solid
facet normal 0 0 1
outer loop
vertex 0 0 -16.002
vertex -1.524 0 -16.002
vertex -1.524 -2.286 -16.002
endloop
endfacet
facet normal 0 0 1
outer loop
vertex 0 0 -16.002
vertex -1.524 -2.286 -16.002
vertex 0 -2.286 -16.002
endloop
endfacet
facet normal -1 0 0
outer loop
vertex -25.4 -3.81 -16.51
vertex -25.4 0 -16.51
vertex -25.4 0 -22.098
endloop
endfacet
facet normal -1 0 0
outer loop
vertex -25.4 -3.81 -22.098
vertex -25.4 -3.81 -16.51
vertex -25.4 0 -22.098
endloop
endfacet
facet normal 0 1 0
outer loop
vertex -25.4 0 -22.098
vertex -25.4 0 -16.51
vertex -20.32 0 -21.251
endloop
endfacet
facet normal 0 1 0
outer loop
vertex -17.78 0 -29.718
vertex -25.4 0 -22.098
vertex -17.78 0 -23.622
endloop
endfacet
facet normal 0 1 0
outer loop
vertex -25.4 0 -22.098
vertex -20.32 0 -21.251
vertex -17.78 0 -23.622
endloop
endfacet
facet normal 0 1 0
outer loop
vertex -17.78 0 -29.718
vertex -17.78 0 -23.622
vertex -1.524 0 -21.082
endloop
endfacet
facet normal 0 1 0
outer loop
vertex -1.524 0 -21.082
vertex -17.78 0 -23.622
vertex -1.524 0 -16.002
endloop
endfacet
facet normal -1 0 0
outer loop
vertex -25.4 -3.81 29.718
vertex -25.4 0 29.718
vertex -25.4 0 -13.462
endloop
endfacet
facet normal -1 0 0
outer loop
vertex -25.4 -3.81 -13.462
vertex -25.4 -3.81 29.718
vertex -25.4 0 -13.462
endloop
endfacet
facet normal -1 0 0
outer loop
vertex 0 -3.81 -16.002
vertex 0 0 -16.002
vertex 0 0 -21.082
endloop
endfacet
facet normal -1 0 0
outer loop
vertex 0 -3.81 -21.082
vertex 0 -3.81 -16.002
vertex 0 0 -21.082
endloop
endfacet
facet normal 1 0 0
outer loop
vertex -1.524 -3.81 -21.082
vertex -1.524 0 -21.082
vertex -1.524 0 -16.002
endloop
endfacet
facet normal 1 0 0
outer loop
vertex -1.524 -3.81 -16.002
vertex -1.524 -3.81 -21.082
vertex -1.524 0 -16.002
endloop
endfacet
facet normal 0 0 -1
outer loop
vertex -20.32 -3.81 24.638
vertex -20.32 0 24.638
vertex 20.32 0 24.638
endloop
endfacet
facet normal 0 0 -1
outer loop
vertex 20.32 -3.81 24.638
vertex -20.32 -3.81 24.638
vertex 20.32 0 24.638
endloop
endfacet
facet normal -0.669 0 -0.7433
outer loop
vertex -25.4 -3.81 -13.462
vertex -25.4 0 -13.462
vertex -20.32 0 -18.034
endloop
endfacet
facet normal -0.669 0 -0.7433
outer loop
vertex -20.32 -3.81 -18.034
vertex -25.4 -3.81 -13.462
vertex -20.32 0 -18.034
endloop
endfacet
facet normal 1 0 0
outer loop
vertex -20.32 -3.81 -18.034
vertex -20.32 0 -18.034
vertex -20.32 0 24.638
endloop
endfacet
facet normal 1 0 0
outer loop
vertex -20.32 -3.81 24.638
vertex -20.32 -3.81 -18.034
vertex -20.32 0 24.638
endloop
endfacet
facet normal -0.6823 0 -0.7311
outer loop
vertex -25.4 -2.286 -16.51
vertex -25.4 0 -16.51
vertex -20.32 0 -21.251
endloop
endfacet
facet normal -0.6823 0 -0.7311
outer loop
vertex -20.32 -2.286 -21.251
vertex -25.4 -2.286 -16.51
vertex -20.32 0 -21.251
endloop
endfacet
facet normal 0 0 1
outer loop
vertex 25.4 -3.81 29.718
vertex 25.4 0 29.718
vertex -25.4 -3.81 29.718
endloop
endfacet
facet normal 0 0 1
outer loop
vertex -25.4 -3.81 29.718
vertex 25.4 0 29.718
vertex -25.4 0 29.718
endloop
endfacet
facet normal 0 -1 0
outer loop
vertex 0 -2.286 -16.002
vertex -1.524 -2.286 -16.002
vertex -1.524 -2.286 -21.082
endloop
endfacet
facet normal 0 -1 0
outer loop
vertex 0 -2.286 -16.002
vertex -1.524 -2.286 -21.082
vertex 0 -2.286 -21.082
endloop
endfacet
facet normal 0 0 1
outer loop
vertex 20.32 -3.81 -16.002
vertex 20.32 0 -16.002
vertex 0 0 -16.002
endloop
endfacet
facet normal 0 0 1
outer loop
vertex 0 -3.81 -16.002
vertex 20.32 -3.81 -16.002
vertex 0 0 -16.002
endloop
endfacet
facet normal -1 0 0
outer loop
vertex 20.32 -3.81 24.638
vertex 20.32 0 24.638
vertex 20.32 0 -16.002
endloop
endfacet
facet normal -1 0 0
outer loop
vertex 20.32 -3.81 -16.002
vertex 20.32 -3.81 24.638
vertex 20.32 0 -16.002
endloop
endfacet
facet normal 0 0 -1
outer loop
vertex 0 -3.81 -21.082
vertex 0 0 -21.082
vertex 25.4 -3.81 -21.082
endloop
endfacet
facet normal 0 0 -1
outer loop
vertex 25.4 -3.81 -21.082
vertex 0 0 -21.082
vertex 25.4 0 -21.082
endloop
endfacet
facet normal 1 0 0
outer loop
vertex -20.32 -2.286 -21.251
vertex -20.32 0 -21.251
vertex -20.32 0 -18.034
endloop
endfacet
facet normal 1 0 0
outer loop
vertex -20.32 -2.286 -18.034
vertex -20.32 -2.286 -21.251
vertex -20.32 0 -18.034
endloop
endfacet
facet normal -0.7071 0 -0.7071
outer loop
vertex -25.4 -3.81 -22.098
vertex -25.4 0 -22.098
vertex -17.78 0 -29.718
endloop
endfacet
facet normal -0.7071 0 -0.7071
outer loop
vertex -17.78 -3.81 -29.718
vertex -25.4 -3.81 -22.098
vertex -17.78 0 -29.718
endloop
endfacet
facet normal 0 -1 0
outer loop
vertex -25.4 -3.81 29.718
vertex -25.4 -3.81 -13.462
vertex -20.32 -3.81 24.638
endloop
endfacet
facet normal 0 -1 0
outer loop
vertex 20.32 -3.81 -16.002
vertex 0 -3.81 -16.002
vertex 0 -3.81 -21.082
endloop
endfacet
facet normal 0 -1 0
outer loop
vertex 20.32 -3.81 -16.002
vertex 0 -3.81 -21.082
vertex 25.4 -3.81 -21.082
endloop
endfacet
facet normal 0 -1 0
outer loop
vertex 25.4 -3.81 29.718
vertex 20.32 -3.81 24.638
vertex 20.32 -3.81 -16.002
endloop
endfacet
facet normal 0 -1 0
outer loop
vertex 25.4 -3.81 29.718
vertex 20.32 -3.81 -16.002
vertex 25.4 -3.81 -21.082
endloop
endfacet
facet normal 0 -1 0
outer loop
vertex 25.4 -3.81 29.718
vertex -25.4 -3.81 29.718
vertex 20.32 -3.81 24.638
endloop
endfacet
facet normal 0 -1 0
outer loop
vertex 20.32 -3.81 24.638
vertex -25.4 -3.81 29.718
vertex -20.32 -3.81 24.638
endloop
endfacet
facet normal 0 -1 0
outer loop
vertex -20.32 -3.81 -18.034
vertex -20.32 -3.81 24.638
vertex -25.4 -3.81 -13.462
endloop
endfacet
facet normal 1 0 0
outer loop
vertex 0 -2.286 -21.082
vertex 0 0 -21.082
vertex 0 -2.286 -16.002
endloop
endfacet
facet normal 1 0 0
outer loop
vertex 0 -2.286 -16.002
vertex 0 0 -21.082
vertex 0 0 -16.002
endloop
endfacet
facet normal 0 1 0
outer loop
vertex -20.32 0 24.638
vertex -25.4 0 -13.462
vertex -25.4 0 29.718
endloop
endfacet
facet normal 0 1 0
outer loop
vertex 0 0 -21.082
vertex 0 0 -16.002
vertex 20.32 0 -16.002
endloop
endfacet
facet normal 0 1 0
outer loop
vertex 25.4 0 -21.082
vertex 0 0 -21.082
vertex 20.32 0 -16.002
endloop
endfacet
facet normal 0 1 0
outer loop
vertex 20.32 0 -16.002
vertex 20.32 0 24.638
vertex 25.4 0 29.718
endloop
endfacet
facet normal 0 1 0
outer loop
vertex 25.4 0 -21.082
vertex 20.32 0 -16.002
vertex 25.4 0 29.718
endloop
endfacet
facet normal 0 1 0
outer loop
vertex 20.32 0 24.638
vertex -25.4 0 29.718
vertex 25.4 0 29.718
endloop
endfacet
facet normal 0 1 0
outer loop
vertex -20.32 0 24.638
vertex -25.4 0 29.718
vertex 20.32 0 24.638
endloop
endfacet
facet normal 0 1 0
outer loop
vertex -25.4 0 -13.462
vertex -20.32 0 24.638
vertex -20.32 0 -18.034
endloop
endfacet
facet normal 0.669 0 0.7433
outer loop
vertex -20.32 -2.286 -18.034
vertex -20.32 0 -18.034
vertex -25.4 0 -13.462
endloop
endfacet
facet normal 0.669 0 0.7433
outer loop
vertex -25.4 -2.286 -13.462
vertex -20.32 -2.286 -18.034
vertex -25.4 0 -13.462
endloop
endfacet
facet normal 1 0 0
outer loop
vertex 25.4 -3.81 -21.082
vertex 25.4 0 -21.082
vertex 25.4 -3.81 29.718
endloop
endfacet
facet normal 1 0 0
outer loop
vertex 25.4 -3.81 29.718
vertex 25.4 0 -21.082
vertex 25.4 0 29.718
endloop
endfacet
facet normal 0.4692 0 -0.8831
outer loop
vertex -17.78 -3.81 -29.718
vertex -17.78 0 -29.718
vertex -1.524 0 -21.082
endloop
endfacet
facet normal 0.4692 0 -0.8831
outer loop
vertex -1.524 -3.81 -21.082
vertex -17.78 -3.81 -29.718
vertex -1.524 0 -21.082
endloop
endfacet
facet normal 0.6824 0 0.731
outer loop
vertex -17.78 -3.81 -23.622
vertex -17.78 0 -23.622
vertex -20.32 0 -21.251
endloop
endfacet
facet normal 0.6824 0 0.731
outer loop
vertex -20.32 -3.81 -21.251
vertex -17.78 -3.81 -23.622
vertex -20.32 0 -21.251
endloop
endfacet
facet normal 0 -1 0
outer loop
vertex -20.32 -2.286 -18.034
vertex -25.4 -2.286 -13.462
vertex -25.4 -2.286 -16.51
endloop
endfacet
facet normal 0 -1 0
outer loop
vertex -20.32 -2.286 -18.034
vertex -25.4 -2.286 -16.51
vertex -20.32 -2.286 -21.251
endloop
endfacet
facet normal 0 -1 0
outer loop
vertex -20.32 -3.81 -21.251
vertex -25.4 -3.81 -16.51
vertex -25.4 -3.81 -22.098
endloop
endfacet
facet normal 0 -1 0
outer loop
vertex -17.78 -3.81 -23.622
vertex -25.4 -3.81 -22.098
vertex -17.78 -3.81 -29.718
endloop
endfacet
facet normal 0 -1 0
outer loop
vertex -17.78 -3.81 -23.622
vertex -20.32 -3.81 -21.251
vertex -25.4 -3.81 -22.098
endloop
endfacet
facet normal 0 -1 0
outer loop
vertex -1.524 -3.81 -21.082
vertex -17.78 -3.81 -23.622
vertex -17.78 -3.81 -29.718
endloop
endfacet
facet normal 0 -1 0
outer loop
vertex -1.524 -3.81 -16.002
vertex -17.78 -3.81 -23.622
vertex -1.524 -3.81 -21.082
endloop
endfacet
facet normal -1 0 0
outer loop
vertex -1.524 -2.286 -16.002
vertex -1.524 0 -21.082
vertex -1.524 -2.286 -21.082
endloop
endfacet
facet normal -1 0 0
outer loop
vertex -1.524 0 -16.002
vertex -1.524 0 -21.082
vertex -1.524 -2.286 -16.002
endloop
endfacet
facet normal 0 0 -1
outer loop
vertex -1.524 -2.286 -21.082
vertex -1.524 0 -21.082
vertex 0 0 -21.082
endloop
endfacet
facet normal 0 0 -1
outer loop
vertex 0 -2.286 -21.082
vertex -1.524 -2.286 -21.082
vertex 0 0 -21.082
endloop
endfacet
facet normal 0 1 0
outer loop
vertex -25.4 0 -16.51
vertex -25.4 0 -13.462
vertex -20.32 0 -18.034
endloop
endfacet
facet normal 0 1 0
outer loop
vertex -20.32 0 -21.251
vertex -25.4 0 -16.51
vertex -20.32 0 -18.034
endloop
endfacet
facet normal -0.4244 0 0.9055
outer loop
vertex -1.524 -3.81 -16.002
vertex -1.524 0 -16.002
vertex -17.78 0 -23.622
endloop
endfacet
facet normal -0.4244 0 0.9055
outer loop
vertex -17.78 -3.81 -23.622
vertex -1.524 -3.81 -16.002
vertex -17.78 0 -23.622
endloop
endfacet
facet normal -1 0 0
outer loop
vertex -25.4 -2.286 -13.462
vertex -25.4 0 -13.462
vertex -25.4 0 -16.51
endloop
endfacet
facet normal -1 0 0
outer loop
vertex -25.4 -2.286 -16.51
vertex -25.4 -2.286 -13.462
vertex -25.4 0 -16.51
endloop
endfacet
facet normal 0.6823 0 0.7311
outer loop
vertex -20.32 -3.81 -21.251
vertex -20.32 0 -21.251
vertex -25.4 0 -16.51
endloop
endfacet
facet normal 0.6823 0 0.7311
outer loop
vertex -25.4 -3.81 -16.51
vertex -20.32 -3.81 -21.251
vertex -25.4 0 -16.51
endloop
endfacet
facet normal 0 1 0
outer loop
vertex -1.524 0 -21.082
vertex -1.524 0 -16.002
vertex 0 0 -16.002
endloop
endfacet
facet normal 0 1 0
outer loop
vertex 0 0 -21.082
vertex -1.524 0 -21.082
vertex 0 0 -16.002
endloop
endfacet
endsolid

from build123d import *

# Parameters (mm, degrees)
F1_DEPTH = 3.81
F0_W     = 1.524
F0_H     = 5.08
F2_DEPTH = 2.286


with BuildPart() as f1:
    # F0 (on Front) → F1 (new body)
    with BuildSketch(Plane.XZ):
        Polygon((25.4, 29.718), (-25.4, 29.718), (-25.4, -13.462), (-20.32, -18.034), (-20.32, 24.638), (20.32, 24.638), (20.32, -16.002), (0, -16.002), (0, -21.082), (25.4, -21.082), align=None)
        Polygon((-20.32, -21.251333), (-25.4, -16.51), (-25.4, -22.098), (-17.78, -29.718), (-1.524, -21.082), (-1.524, -16.002), (-17.78, -23.622), align=None)
    extrude(amount=F1_DEPTH)


with BuildPart() as f2:
    # F0 (on Front) → F2 (new body)
    with BuildSketch(Plane.XZ):
        Polygon((-20.32, -18.034), (-25.4, -13.462), (-25.4, -16.51), (-20.32, -21.251333), align=None)
        with Locations((-0.762, -18.542)):
            Rectangle(F0_W, F0_H)
    extrude(amount=F2_DEPTH)


solid = Compound([f1.part, f2.part])
